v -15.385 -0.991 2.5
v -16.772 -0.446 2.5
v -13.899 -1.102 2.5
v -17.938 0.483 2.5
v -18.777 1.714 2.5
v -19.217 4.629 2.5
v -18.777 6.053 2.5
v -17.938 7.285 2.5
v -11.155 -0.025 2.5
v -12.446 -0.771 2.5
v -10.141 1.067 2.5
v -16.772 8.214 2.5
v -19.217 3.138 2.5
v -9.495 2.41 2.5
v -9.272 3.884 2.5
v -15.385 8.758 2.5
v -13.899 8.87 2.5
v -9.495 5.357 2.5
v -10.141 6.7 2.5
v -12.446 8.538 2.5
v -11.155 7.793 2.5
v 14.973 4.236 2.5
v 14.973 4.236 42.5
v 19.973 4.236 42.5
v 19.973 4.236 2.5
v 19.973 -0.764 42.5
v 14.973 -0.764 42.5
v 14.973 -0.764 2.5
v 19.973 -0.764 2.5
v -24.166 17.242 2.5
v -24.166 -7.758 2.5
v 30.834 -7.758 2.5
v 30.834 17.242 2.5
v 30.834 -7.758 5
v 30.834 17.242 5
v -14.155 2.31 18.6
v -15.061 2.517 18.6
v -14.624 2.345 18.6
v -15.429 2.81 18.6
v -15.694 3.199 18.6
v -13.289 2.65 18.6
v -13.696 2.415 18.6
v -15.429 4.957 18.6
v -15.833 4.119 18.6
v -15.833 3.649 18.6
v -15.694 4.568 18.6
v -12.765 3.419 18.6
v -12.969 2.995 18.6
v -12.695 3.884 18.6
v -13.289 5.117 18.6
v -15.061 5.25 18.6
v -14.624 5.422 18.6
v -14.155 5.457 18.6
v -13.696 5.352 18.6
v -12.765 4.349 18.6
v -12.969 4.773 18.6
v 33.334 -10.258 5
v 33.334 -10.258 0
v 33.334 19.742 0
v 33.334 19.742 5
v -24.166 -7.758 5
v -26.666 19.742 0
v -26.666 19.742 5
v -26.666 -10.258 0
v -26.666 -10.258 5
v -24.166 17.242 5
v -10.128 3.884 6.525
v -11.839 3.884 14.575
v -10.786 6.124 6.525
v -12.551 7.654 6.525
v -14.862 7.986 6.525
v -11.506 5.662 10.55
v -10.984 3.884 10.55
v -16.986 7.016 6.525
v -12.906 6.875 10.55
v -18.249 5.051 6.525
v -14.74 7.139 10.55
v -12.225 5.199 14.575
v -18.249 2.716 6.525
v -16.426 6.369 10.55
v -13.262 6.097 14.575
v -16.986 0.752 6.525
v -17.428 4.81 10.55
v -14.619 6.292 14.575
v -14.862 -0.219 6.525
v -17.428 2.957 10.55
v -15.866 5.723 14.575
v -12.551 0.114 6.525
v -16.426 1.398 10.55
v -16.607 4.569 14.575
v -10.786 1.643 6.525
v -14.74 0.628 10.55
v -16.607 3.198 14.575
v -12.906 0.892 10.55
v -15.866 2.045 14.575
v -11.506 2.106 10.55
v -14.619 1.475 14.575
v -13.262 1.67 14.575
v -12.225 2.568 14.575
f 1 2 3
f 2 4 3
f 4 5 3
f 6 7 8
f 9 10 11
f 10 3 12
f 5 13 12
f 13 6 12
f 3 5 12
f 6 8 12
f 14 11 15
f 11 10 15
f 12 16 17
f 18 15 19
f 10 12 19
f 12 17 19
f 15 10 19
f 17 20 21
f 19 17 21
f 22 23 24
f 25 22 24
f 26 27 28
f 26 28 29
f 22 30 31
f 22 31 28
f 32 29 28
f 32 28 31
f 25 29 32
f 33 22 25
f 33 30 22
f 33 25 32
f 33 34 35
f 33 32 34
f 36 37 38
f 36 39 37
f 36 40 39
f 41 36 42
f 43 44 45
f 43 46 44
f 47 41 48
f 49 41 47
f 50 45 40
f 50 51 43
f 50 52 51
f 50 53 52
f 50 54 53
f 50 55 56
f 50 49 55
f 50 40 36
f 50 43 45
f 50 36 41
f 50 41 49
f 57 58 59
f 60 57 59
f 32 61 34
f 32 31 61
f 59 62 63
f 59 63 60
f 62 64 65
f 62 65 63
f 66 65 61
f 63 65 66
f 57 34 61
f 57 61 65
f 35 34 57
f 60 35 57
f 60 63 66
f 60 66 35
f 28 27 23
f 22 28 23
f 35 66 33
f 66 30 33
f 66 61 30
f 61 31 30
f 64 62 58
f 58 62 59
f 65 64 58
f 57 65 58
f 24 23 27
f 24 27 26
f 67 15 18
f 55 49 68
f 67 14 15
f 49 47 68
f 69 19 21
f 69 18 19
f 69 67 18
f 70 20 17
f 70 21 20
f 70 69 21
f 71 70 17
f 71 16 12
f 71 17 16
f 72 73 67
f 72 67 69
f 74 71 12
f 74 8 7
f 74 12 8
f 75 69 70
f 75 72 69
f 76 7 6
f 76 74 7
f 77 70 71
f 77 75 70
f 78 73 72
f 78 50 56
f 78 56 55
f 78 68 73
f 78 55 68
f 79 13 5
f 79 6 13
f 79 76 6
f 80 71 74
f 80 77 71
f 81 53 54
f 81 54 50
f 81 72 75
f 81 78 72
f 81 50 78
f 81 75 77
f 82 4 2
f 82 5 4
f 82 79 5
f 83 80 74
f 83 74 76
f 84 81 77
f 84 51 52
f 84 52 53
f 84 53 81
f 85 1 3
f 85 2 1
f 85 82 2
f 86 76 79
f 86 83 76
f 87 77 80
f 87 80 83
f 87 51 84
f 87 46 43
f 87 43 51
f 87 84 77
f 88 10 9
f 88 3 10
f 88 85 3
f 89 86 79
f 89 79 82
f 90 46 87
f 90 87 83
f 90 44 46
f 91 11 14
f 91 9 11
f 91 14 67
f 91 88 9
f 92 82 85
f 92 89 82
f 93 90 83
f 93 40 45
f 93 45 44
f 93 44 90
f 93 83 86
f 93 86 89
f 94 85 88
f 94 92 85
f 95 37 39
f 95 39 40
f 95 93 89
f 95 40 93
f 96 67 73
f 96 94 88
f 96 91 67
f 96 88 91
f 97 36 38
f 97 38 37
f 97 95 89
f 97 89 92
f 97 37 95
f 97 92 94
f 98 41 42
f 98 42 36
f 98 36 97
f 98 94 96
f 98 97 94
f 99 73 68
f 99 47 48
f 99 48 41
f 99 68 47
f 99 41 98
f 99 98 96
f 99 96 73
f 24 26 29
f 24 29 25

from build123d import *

# Parameters (mm, degrees)
F0_W     = 60
F0_H     = 30
F1_DEPTH = 5
F2_T     = -2.5
F3_R     = 5
F4_DEPTH = 16.1
F4_TAPER = 12
F7_W     = 5
F7_H     = 5
F8_DEPTH = 40


with BuildPart() as f1:
    # F0 (on Top) → F1 (new body)
    with BuildSketch(Plane.XY):
        with Locations((3.3342742734, 4.7416886237)):
            Rectangle(F0_W, F0_H)
    extrude(amount=F1_DEPTH)

    # F2
    f2_openings = [f1.faces().sort_by_distance(p)[0] for p in [
        (3.334274, 4.741689, 5),
    ]]
    offset(amount=F2_T, openings=f2_openings)

    # F7 (on face) → F8 (join)
    with BuildSketch(Plane.XY.offset(2.5)):
        with Locations((17.4725097045, 1.7358051971)):
            Rectangle(F7_W, F7_H)
    extrude(amount=F8_DEPTH)


with BuildPart() as f4:
    # F3 (on Top) → F4 (new body)
    with BuildSketch(Plane.XY):
        with Locations((22.6275715977, 1.1836937629)):
            Circle(F3_R)
    extrude(amount=F4_DEPTH, taper=F4_TAPER)


with BuildPart() as f4_1:
    # F5: moved
    add(f4.part.moved(Location((-37, 2.7, 5.7))))


with BuildPart() as f4_2:
    # F6: moved
    add(f4_1.part.moved(Location((0.1, 0, -3.2))))


solid = Compound([f1.part, f4_2.part])
